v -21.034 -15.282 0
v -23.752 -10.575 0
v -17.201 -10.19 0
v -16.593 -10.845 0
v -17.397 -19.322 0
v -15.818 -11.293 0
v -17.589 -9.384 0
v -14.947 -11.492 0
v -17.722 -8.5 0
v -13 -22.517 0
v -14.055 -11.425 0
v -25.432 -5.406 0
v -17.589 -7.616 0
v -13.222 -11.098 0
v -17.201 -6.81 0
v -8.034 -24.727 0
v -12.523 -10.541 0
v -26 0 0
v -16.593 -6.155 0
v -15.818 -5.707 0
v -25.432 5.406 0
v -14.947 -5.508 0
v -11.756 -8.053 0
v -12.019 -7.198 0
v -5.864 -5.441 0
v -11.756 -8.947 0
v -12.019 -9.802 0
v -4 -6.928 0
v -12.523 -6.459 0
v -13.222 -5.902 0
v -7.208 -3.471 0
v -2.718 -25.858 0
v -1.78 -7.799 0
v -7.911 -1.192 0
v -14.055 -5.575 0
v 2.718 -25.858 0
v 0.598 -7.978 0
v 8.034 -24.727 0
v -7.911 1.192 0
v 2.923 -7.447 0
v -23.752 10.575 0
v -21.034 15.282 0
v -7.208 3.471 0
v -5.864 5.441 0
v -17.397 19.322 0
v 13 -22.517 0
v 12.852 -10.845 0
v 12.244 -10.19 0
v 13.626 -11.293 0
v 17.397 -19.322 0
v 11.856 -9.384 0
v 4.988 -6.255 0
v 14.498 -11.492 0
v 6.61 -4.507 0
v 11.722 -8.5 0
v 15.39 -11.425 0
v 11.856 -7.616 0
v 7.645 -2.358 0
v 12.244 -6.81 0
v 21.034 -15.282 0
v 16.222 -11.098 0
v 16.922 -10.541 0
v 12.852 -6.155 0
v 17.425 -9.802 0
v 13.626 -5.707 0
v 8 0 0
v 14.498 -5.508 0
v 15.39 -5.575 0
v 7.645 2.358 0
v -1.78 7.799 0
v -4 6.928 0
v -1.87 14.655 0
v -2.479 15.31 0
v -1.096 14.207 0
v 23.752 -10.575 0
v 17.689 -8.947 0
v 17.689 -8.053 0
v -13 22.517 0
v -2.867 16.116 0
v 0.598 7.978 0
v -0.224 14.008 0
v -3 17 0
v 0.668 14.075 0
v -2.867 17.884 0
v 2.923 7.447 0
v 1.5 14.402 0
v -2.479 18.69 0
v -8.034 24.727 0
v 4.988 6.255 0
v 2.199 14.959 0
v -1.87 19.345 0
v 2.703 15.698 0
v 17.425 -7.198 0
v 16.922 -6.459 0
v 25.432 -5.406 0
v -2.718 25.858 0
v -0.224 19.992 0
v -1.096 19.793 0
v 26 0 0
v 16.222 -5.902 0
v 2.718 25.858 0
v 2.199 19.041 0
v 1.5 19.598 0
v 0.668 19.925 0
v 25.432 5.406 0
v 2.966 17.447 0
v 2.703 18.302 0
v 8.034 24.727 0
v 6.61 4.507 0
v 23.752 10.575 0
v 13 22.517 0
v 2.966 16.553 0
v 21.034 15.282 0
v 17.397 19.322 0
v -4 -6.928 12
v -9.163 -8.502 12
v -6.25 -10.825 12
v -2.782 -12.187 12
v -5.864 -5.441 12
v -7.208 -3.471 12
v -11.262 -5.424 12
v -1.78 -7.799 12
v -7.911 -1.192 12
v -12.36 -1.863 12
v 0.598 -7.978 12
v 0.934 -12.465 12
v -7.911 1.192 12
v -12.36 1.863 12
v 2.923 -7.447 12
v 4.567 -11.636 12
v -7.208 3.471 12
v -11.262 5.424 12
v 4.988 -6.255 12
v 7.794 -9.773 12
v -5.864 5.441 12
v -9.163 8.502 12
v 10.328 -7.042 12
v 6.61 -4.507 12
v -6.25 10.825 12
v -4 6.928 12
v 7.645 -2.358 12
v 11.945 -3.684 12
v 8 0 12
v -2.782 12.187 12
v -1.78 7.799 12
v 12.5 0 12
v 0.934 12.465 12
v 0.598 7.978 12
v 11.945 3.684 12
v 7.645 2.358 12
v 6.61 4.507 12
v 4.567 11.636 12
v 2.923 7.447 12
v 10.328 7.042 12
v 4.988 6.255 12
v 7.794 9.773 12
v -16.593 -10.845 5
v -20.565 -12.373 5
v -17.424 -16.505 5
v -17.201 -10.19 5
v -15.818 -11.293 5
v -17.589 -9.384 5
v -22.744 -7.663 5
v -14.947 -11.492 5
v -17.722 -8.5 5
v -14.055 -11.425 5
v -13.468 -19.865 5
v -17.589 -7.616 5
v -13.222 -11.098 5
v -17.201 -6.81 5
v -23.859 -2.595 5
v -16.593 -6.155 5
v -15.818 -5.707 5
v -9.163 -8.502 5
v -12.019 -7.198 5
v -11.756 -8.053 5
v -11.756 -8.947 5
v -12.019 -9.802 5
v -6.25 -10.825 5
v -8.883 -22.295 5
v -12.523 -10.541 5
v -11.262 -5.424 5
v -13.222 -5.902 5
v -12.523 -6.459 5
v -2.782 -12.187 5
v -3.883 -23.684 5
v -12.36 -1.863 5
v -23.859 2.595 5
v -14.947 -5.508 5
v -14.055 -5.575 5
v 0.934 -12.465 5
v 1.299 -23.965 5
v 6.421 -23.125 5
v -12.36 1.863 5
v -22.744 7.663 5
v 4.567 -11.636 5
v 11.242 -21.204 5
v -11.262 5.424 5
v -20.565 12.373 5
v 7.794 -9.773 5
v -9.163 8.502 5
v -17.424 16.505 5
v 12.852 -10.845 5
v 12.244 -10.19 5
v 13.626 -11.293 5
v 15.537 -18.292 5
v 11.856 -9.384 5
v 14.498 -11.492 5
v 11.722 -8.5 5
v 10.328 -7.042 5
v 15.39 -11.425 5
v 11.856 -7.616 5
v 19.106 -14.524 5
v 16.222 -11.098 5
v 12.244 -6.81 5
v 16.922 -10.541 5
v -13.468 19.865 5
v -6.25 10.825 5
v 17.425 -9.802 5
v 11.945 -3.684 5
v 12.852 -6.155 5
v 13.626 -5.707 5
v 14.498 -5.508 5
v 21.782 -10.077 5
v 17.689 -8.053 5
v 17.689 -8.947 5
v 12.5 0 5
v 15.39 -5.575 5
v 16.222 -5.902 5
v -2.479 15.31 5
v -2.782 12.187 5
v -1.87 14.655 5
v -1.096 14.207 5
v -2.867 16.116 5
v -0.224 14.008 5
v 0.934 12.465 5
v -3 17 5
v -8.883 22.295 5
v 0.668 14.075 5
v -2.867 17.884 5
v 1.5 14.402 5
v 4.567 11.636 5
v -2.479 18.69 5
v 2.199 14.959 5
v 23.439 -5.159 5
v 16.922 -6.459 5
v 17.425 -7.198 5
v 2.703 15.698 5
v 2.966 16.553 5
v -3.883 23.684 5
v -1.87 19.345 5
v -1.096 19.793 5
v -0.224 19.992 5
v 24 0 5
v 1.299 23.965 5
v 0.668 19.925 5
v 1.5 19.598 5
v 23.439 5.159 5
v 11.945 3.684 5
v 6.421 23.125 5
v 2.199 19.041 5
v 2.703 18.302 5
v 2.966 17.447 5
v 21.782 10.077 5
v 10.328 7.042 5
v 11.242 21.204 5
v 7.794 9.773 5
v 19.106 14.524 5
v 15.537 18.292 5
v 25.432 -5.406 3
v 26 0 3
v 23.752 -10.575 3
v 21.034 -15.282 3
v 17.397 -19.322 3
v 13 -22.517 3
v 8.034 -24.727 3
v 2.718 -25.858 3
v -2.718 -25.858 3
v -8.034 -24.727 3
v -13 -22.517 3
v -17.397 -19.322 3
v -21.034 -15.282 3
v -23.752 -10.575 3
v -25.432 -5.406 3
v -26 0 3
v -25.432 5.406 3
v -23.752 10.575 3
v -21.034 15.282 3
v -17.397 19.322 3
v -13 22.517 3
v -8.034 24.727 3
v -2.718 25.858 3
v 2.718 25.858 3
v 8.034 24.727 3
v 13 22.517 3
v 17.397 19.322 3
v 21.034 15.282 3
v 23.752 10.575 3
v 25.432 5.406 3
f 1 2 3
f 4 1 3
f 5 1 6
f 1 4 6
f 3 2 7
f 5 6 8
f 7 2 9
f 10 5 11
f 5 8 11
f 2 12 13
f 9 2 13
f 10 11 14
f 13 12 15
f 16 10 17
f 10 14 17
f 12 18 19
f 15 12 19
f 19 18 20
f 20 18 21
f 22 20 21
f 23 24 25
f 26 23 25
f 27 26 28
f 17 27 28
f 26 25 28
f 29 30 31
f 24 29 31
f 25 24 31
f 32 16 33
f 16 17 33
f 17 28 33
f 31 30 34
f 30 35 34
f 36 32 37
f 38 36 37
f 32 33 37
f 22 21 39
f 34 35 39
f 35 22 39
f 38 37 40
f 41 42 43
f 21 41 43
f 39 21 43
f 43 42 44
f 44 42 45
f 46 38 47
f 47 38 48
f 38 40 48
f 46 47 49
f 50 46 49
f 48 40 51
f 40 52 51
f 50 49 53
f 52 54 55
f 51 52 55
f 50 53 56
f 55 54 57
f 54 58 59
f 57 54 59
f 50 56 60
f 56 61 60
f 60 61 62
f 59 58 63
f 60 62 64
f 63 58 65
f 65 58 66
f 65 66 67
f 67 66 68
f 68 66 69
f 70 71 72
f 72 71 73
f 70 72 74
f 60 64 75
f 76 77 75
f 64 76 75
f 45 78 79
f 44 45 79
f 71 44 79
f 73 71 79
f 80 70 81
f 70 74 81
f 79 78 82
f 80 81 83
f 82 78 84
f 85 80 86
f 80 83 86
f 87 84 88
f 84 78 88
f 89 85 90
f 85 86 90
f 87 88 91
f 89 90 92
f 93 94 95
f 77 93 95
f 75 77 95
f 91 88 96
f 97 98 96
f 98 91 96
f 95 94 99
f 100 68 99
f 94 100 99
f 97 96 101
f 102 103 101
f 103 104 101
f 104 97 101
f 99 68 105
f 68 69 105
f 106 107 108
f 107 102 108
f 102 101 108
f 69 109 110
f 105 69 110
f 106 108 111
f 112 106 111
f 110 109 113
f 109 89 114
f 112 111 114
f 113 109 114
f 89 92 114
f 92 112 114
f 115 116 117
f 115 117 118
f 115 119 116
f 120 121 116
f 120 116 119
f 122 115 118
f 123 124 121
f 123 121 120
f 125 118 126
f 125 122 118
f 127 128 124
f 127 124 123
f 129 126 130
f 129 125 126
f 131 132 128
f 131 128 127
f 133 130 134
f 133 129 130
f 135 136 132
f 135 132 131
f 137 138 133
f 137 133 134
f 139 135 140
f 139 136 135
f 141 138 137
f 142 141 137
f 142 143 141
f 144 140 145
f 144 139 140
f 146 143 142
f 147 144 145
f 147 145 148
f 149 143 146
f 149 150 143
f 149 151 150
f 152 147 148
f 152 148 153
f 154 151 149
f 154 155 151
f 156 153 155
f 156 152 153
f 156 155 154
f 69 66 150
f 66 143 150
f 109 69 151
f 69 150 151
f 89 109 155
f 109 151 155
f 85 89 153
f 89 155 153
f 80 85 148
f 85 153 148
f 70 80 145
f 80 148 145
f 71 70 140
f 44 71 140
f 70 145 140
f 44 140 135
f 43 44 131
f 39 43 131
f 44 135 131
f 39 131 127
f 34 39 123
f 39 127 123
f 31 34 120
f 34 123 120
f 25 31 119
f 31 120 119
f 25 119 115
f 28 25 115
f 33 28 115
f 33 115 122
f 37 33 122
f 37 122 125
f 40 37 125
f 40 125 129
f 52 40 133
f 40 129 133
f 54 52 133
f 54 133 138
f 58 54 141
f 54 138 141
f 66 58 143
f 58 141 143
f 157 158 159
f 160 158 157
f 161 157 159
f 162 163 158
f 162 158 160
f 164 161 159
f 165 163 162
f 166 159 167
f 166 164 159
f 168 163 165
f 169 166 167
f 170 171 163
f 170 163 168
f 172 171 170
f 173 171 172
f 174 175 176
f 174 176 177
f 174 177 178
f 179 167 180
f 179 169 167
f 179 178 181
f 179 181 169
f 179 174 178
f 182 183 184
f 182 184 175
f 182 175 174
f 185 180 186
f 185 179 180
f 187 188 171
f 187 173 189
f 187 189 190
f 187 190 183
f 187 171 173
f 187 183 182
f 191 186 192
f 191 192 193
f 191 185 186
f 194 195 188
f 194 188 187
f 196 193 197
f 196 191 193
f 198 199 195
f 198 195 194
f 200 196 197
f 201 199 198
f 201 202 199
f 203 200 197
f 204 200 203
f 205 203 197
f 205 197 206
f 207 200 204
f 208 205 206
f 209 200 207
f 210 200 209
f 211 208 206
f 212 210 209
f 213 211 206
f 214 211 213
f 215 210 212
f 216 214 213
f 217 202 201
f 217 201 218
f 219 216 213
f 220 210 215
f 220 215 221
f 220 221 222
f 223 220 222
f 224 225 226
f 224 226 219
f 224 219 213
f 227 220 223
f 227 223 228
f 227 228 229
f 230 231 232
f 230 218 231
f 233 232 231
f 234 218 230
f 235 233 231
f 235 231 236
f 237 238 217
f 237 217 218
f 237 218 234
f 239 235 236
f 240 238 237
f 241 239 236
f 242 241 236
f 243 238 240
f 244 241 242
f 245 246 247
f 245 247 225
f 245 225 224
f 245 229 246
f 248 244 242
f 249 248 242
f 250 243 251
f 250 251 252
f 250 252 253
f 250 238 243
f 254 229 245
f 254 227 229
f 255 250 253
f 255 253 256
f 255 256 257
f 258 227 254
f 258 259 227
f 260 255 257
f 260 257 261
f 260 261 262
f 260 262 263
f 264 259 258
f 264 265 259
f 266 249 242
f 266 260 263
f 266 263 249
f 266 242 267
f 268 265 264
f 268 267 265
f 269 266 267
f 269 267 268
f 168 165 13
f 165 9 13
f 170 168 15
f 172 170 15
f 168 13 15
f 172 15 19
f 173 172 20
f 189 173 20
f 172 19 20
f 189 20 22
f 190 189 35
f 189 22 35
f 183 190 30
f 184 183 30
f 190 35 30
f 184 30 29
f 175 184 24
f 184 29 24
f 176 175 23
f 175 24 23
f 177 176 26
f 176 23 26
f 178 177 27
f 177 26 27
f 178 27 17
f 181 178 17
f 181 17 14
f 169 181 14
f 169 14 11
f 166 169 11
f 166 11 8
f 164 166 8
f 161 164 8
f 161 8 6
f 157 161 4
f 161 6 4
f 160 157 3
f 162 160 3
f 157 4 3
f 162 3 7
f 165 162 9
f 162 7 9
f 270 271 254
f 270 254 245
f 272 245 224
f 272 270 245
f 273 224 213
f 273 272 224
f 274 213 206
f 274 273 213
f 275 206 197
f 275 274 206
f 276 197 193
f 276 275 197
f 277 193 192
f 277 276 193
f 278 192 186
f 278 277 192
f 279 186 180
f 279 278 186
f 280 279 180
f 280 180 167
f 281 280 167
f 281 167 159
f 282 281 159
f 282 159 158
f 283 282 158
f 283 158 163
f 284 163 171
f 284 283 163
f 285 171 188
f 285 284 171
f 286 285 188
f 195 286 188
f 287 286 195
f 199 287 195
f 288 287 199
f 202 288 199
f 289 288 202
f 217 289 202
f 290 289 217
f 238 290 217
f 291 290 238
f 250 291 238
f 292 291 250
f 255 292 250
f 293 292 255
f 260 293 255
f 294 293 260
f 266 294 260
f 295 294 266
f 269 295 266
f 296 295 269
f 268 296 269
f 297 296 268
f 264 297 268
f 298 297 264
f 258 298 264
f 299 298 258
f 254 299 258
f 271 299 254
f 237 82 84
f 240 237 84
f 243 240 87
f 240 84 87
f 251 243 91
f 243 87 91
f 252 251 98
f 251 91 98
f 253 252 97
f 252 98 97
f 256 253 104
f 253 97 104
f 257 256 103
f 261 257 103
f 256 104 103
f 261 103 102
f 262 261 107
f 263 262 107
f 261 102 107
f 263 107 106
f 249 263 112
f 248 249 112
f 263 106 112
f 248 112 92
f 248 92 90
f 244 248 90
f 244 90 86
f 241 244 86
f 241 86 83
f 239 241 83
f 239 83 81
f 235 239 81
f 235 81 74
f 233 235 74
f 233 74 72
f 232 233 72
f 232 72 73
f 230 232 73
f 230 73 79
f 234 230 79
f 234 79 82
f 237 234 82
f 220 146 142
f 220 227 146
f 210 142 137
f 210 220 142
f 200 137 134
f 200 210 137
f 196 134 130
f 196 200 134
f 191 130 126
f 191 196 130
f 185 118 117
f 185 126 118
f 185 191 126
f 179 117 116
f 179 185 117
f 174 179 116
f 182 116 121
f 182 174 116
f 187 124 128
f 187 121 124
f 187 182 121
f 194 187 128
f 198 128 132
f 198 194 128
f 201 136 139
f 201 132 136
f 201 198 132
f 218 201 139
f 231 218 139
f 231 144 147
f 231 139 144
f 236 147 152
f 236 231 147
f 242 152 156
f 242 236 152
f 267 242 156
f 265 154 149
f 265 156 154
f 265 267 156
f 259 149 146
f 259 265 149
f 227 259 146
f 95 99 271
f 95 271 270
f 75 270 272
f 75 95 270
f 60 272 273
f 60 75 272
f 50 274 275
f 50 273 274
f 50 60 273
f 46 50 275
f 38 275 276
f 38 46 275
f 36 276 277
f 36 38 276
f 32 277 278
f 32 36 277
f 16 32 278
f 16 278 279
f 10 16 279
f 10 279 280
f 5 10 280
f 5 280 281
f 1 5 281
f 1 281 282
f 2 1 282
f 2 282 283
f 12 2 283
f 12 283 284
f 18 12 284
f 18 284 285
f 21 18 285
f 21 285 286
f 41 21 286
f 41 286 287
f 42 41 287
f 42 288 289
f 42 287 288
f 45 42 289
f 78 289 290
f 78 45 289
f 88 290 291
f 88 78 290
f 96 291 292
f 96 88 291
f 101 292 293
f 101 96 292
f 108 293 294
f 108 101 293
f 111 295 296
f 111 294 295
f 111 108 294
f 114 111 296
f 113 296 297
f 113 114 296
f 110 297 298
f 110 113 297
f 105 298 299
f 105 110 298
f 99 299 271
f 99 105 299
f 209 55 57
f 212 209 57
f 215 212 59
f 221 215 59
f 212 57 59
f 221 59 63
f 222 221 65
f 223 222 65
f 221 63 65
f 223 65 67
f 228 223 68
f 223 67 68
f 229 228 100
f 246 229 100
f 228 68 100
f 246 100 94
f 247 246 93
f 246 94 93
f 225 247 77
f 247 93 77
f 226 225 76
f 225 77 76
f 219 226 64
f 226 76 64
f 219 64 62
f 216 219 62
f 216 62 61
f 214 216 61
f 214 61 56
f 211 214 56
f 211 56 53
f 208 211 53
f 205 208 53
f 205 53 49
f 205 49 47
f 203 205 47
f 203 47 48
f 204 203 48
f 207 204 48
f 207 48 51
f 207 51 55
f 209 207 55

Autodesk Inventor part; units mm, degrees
ref_plane "YZ Plane" through (0, 0, 0) normal (1, 0, 0) x (0, 1, 0)
sketch "Sketch1" plane through (0, 0, 0) normal (0, 0, 1) x (1, 0, 0)
  circle A0 centre (0, 0) radius 26
  dimension "d0" = 52
extrude "Extrusion1" add sketch "Sketch1" along normal blind 5
chamfer "Chamfer2" distance 2 angle 45 1 edges at (-26, 0, 5)
ref_plane "Work Plane3" through (0, 0, 5) normal (0, 0, 1) x (1, 0, 0)
sketch "Sketch3" plane through (0, 0, 5) normal (0, 0, 1) x (1, 0, 0)
  circle A0 centre (0, 0) radius 12.5
  dimension "d6" = 25
extrude "Extrusion2" add sketch "Sketch3" along normal blind 7
ref_plane "Work Plane4" through (0, 0, 12) normal (0, 0, 1) x (1, 0, 0)
sketch "Sketch4" plane through (0, 0, 12) normal (0, 0, 1) x (1, 0, 0)
  circle A0 centre (0, 0) radius 8
  dimension "d9" = 16
extrude "Extrusion3" cut sketch "Sketch4" against normal blind 12
sketch "Sketch2" plane through (0, 0, 0) normal (0, 0, -1) x (-1, 0, 0)
  line L0 (0, 0) -> (-23.1702, 23.1702)
  line L1 (0, 0) -> (32.7676, 0) construction
  line L2 (-23.1702, 23.1702) -> (18.3848, -18.3848)
  circle A0 centre (0, 0) radius 26 projected
  line L3 (0, 0) -> (-21.488, -21.488)
  line L4 (0, 0) -> (30.3887, 0) construction
  line L5 (-21.488, -21.488) -> (18.3848, 18.3848)
  circle A1 centre (0, 0) radius 8 projected
  line L6 (0, 8) -> (0, 17)
  circle A2 centre (0, 17) radius 3
  line L7 (0, -26) -> (0, 26)
  circle A3 centre (-14.7224, -8.5) radius 3
  circle A4 centre (14.7224, -8.5) radius 3
  dimension "d4" = 135
  dimension "d5" = 135
  dimension "d19" = 9
  dimension "d20" = 6
  dimension "d23" = 360
extrude "Extrusion4" cut sketch "Sketch2" against normal blind 12 contours A2 L7 L6 | L6 L7 A2 | A3 | A4
properties part number "EndBush" material "Titanium"
